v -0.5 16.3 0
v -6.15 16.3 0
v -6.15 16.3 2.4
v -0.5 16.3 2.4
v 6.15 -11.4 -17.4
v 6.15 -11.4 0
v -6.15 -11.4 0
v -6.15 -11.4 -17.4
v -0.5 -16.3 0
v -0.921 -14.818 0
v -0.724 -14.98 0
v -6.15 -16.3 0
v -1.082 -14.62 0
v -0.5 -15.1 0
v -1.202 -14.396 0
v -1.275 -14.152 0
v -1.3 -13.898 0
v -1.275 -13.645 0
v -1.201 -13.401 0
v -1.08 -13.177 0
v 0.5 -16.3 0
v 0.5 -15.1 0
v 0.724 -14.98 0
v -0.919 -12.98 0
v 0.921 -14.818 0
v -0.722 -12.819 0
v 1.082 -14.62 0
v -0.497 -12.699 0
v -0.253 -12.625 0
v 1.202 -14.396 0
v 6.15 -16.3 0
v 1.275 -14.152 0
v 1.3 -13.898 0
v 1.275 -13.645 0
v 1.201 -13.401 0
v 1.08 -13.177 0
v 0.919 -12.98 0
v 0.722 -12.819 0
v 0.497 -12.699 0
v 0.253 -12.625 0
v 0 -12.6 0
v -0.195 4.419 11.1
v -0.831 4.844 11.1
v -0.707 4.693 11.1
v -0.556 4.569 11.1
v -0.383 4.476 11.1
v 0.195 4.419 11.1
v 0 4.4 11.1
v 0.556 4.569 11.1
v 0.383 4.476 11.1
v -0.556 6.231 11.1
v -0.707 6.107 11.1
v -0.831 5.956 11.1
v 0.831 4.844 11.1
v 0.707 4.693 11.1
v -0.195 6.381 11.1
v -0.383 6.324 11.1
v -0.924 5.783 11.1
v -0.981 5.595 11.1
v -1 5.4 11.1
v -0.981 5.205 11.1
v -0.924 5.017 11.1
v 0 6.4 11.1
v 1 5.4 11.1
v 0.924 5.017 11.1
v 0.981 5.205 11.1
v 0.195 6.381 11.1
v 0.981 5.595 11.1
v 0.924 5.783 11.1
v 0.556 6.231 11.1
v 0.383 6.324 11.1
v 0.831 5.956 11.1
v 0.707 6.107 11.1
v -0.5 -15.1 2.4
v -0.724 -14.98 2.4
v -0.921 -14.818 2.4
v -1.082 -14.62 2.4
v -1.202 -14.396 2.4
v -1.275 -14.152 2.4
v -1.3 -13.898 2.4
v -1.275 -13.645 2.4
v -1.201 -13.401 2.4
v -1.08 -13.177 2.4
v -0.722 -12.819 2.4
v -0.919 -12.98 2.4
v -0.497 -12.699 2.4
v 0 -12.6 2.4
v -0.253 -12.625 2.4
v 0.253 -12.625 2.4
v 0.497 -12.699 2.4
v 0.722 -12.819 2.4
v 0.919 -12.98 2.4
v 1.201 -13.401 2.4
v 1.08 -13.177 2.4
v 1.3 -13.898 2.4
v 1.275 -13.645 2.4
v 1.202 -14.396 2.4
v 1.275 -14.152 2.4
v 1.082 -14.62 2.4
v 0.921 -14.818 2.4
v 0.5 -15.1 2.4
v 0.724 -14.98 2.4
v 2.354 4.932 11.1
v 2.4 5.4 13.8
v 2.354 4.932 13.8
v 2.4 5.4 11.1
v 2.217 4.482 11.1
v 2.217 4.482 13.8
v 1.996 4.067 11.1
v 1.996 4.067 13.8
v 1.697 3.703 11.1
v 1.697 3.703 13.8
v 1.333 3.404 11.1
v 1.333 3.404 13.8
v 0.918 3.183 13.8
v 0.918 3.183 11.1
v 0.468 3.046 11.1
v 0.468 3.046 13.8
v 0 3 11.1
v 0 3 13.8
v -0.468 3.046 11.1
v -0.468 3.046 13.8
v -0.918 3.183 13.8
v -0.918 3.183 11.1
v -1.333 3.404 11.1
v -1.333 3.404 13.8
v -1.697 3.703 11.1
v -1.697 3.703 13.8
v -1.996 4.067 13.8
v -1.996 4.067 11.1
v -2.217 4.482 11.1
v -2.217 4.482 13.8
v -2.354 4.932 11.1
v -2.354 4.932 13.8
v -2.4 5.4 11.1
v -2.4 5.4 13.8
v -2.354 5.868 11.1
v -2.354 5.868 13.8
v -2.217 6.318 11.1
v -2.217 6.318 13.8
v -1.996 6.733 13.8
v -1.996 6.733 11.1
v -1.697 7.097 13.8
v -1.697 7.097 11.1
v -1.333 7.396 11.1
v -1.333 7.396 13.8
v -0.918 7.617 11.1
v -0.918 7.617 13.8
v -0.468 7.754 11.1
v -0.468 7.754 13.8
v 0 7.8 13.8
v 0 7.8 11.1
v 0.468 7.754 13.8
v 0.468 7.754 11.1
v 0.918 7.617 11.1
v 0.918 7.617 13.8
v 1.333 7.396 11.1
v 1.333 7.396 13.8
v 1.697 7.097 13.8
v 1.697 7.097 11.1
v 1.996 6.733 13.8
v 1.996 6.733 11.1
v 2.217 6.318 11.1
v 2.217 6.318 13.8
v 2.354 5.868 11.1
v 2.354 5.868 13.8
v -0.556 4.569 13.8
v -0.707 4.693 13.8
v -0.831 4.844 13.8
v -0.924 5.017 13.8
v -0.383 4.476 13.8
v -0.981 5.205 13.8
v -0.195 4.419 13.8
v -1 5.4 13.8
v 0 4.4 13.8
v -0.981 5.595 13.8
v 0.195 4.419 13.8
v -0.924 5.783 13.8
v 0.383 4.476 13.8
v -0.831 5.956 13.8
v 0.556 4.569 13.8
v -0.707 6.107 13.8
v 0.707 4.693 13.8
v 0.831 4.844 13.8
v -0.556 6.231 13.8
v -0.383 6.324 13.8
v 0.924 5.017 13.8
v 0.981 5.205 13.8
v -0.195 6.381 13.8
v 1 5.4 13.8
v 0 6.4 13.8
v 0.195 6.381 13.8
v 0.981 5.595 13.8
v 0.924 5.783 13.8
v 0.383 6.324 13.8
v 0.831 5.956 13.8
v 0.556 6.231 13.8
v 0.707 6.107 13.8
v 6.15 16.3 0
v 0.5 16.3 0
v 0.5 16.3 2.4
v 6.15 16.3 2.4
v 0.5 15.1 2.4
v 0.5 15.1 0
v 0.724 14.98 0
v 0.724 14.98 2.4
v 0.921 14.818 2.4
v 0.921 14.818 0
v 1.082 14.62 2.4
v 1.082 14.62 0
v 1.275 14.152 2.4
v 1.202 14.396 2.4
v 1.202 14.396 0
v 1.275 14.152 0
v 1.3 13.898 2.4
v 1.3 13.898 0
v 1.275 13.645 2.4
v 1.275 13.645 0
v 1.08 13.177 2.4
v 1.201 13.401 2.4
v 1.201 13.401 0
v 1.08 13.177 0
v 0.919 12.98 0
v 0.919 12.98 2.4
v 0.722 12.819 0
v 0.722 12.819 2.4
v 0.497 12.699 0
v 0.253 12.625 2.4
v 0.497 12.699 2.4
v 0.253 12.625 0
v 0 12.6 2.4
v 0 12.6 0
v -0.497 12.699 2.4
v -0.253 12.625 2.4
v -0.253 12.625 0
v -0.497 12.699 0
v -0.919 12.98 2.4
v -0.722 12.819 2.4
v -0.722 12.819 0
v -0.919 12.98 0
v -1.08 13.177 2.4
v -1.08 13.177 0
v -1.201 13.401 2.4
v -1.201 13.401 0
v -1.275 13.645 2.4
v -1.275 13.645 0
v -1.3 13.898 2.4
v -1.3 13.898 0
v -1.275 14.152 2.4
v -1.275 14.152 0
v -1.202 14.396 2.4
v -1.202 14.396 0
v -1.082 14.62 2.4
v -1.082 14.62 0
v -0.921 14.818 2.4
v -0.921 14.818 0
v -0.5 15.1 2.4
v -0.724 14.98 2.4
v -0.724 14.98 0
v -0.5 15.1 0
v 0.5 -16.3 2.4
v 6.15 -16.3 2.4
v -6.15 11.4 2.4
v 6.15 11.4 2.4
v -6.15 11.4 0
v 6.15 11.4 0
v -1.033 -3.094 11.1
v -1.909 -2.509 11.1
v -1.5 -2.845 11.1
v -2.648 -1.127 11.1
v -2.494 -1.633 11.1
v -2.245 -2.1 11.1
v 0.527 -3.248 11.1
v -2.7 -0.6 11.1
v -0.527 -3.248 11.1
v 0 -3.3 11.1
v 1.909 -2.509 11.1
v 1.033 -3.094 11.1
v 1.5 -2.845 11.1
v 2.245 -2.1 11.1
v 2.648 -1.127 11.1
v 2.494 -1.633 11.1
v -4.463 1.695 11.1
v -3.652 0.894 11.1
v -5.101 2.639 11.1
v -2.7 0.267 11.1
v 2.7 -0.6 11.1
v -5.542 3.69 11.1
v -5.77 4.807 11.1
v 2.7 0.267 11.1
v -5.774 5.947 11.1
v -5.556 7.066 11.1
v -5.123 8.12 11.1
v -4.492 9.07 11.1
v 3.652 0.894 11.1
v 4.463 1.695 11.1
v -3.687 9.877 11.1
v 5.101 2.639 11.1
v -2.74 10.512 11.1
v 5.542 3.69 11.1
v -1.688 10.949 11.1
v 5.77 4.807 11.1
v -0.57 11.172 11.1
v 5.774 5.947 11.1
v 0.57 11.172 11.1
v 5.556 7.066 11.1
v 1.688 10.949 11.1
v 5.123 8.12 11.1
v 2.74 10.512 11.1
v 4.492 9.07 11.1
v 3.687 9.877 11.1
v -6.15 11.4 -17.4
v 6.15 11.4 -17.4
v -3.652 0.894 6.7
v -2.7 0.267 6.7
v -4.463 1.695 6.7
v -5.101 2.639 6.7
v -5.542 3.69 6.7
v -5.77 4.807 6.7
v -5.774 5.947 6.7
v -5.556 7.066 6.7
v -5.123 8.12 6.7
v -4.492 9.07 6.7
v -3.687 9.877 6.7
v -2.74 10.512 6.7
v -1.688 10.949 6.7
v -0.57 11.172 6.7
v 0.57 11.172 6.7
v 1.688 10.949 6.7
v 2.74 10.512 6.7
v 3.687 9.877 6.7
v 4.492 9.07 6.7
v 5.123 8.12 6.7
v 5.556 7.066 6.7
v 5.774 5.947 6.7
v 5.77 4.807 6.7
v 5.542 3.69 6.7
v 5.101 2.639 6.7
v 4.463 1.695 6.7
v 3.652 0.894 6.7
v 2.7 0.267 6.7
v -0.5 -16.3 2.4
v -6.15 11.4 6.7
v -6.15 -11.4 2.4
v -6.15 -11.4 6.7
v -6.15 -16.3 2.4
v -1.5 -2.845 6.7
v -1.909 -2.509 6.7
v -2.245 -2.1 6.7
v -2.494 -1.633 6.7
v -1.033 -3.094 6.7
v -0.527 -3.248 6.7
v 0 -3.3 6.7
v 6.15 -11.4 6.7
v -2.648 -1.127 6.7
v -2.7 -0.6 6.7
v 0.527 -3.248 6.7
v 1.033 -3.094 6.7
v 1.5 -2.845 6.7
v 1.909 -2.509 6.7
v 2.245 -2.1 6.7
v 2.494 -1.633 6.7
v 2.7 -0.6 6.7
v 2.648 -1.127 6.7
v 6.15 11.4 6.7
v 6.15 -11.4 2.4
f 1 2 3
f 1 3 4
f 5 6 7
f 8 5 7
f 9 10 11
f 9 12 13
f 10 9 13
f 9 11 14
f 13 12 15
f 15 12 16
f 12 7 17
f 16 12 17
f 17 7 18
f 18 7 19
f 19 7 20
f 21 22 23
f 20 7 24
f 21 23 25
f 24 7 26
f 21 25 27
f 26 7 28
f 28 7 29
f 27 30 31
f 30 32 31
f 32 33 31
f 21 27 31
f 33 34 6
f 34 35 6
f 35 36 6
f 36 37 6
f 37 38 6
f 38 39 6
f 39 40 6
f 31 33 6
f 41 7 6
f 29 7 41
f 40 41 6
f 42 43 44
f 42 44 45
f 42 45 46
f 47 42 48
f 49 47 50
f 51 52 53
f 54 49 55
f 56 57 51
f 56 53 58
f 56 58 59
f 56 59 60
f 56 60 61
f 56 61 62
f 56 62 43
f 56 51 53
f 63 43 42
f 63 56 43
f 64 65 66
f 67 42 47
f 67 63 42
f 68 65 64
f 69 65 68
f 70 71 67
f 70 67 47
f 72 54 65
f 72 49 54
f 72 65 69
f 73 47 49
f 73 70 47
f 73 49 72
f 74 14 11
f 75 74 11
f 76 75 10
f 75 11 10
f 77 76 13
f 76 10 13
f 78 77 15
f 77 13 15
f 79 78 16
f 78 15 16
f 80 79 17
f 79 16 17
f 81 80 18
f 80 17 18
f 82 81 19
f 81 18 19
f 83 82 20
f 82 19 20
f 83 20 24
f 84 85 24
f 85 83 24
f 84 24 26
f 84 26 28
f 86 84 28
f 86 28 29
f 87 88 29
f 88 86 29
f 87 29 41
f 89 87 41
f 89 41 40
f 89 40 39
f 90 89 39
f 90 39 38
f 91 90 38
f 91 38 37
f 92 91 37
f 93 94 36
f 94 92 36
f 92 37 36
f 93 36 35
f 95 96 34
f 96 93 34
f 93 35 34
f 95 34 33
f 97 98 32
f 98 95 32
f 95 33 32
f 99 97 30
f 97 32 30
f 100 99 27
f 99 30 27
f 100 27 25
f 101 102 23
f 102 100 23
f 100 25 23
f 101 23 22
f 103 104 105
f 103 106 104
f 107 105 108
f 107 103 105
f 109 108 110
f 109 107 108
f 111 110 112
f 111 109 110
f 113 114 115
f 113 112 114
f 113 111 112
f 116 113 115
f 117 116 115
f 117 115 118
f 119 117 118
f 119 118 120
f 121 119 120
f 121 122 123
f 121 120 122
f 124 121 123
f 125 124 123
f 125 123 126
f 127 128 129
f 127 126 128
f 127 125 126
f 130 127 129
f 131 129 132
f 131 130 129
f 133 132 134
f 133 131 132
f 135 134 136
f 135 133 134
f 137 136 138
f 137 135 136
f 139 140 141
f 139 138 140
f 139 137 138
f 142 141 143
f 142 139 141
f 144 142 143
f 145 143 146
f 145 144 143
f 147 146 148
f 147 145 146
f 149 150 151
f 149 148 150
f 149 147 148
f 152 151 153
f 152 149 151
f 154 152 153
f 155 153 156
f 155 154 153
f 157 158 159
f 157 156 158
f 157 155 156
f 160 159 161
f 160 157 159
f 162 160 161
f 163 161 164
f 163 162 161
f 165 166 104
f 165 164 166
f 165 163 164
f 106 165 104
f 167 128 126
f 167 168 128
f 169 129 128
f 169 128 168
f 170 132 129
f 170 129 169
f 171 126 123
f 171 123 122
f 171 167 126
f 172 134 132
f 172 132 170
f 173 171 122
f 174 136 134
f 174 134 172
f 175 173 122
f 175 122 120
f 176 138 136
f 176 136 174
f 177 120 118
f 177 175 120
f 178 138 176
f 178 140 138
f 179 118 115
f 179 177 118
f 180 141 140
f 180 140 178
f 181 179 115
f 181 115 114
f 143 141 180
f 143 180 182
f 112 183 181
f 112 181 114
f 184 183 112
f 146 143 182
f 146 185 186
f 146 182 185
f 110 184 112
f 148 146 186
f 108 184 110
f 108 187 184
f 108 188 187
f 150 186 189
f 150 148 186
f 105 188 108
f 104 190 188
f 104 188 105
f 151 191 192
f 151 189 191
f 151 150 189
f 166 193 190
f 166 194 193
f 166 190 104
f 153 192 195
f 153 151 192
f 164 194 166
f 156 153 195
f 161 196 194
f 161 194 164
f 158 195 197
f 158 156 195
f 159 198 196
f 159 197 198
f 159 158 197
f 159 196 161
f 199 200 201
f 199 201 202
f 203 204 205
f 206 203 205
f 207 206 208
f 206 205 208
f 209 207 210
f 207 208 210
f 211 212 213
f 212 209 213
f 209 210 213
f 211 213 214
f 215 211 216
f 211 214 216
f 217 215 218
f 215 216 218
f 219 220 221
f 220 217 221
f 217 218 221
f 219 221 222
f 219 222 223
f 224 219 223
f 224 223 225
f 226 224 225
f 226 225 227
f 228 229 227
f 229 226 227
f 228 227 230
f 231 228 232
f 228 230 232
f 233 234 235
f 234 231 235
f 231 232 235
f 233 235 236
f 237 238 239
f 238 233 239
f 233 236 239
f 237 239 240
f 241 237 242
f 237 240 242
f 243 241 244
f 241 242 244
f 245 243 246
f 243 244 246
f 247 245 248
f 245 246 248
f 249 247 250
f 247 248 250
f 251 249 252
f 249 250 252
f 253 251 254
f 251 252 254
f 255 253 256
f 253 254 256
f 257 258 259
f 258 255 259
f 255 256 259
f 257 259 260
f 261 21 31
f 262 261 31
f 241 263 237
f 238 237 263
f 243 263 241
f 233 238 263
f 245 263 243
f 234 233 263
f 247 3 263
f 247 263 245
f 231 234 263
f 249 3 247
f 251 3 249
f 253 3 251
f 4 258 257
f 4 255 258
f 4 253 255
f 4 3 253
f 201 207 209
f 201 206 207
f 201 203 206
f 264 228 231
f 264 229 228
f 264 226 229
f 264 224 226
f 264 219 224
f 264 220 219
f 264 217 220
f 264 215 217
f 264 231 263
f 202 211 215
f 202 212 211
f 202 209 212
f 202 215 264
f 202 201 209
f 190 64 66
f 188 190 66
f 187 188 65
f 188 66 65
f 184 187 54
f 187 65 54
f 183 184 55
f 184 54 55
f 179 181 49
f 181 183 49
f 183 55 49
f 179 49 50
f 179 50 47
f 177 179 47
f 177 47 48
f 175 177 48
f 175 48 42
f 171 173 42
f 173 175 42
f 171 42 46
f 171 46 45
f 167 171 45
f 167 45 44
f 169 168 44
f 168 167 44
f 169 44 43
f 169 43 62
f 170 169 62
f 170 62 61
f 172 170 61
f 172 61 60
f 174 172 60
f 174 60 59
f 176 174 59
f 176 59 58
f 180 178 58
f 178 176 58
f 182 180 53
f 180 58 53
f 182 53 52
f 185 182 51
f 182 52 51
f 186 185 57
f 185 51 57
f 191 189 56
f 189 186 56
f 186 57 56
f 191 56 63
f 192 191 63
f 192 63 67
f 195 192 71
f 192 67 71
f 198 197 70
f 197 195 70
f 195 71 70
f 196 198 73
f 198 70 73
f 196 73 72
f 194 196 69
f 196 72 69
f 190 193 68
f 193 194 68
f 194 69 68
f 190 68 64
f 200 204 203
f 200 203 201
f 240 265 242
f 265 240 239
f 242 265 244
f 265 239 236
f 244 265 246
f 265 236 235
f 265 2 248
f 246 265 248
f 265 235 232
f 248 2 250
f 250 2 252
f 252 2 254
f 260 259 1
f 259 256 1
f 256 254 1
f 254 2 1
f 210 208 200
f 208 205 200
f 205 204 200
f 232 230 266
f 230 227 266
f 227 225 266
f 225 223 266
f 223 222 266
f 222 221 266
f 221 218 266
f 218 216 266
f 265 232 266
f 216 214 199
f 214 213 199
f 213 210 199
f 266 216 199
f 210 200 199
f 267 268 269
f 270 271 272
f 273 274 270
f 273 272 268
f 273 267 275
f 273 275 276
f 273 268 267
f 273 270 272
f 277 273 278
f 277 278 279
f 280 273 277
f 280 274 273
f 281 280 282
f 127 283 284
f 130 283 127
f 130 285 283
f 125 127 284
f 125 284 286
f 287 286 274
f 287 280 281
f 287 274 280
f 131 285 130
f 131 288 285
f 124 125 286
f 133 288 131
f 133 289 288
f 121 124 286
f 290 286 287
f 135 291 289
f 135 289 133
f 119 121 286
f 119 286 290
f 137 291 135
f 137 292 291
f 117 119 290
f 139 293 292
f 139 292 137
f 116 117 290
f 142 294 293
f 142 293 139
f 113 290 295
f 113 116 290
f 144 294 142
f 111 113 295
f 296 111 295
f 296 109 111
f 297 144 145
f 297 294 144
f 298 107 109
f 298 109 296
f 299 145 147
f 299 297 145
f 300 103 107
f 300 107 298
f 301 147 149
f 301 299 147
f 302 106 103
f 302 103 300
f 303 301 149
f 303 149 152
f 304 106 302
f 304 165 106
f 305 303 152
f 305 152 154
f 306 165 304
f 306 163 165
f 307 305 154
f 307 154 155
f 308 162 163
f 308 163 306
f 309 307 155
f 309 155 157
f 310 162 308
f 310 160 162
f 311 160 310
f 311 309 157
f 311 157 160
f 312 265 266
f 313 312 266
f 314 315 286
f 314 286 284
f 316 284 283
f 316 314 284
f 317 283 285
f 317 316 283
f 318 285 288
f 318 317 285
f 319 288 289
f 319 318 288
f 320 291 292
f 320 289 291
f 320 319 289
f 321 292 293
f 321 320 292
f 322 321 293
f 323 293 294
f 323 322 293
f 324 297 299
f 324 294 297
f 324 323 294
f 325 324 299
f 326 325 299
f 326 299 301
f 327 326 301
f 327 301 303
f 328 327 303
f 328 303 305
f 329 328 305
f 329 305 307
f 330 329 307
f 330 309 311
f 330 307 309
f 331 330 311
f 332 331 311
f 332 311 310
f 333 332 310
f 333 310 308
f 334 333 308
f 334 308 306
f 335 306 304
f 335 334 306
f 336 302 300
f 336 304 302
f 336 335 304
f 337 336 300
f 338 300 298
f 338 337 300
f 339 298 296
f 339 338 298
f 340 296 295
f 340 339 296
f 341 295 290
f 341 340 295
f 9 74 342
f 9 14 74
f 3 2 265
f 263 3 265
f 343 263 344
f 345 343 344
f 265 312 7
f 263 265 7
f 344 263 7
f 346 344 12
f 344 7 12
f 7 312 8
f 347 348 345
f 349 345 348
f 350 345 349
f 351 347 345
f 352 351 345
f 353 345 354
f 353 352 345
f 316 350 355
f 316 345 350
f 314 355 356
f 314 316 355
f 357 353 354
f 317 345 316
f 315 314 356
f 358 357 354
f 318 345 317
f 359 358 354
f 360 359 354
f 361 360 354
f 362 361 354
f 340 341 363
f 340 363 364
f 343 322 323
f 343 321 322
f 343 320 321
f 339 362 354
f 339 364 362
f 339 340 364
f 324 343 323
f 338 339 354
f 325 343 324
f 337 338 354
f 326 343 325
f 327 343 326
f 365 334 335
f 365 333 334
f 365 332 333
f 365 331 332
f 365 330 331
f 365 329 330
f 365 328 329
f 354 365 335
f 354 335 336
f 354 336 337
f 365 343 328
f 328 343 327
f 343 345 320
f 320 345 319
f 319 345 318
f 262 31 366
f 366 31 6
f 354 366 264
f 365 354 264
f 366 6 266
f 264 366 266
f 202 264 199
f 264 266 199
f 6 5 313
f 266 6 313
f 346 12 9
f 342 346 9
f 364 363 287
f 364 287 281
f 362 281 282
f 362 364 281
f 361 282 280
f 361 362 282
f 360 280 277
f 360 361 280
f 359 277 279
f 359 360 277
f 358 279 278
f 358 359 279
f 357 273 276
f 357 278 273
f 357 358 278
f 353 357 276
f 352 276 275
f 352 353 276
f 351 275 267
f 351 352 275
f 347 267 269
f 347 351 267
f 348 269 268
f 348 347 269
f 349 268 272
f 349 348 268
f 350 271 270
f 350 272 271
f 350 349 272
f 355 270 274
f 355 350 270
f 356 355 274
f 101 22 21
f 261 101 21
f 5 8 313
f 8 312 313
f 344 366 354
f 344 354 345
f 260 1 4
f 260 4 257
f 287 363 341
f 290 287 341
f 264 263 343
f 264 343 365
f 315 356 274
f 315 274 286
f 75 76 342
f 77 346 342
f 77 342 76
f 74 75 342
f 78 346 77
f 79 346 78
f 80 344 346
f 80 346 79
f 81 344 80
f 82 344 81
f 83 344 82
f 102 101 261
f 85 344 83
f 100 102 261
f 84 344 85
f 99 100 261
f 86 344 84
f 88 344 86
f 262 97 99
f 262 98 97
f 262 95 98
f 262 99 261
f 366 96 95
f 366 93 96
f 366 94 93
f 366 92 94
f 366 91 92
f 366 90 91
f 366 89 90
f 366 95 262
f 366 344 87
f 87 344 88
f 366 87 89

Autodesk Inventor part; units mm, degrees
ref_plane "YZ Plane" through (0, 0, 0) normal (1, 0, 0) x (0, 1, 0)
ref_plane "XZ Plane" through (0, 0, 0) normal (0, 1, 0) x (-1, 0, 0)
ref_plane "XY Plane" through (0, 0, 0) normal (0, 0, 1) x (1, 0, 0)
sketch "Sketch1" plane through (0, 0, 0) normal (0, 0, 1) x (1, 0, 0)
  line L0 (6.15, -11.4) -> (-6.15, -11.4)
  line L1 (-6.15, -11.4) -> (-6.15, 11.4)
  line L2 (-6.15, 11.4) -> (6.15, 11.4)
  line L3 (6.15, 11.4) -> (6.15, -11.4)
  line L4 (6.15, -11.4) -> (-6.15, 11.4) construction
  line L5 (-6.15, -11.4) -> (6.15, 11.4) construction
  line L6 (-6.15, 11.4) -> (-6.15, 16.3)
  line L7 (6.15, 16.3) -> (6.15, 11.4)
  line L8 (-6.15, -11.4) -> (-6.15, -16.3)
  line L9 (6.15, -16.3) -> (6.15, -11.4)
  arc A0 (-0.5, 15.1) -> (0.5, 15.1) centre (0, 13.9) ccw
  line L10 (0, 13.9) -> (0, 11.4) construction
  line L11 (-0.5, 16.3) -> (-0.5, 15.1)
  line L12 (0.5, 15.1) -> (0.5, 16.3)
  line L13 (-0.5, 15.1) -> (0.5, 15.1) construction
  line L14 (0, 13.9) -> (0, 15.1) construction
  line L15 (-6.15, 16.3) -> (-0.5, 16.3)
  line L16 (0.5, 16.3) -> (6.15, 16.3)
  arc A1 (0.5, -15.1) -> (-0.5, -15.1) centre (0, -13.9) ccw
  line L17 (-0.5, -15.1) -> (-0.5, -16.3)
  line L18 (0.5, -15.1) -> (0.5, -16.3)
  line L19 (-0.5, -15.1) -> (0.5, -15.1) construction
  line L20 (0, -15.1) -> (0, -13.9) construction
  line L21 (0, -13.9) -> (0, -11.4) construction
  line L22 (-6.15, -16.3) -> (-0.5, -16.3)
  line L23 (0.5, -16.3) -> (6.15, -16.3)
  line L24 (0, 11.4) -> (0, 5.4) construction
  circle A2 centre (0, 5.4) radius 1
  circle A3 centre (0, 5.4) radius 2.4
  arc A4 (-2.7, -0.6) -> (2.7, -0.6) centre (0, -0.6) ccw
  line L25 (0, 5.4) -> (0, -0.6) construction
  line L26 (-2.7, -0.6) -> (-2.7, 0.2668)
  line L27 (2.7, -0.6) -> (2.7, 0.2668)
  arc A5 (2.7, 0.2668) -> (-2.7, 0.2668) centre (0, 5.4) ccw
  point P0 (0, 0)
  dimension "d0" = 22.8
  dimension "d1" = 12.3
  dimension "d4" = 2.6
  dimension "d5" = 2.5
  dimension "d6" = 1
  dimension "d7" = 4.9
  dimension "d8" = 2.5
  dimension "d9" = 1
  dimension "d10" = 2.6
  dimension "d11" = 4.9
  dimension "d14" = 6
  dimension "d15" = 2
  dimension "d16" = 4.8
  dimension "d17" = 5.4
  dimension "d18" = 6
  dimension "d19" = 5.8
extrude "Extrusion1" add sketch "Sketch1" against normal blind 17.4 contours L0 L1 L2 L3 | A2 | A3 | L26 A5 L27 A4
extrude "Extrusion2" add sketch "Sketch1" along normal blind 2.4 contours L9 L23 L18 A1 L17 L22 L8 L0 | L0 L1 L2 L3 | L2 L6 L15 L11 A0 L12 L16 L7 | A2 | A3 | L26 A5 L27 A4
extrude "Extrusion3" add sketch "Sketch1" along normal blind 4.3 from surface at 2.4 contours L0 L1 L2 L3 | A2 | A3 | L26 A5 L27 A4
extrude "Extrusion4" add sketch "Sketch1" along normal blind 4.4 from surface at 6.7 contours A2 | A3 | L26 A5 L27 A4
extrude "Extrusion5" add sketch "Sketch1" along normal blind 2.7 from surface at 11.1 contours A3
equation "\"d8\" = d5"
equation "\"d9\" = d6"
equation "\"d10\" = d4"
equation "\"d11\" = d7"
equation "\"d3\" = d2"
equation "\"d2\" = 4.9"
properties part number "SG90 Servo"
